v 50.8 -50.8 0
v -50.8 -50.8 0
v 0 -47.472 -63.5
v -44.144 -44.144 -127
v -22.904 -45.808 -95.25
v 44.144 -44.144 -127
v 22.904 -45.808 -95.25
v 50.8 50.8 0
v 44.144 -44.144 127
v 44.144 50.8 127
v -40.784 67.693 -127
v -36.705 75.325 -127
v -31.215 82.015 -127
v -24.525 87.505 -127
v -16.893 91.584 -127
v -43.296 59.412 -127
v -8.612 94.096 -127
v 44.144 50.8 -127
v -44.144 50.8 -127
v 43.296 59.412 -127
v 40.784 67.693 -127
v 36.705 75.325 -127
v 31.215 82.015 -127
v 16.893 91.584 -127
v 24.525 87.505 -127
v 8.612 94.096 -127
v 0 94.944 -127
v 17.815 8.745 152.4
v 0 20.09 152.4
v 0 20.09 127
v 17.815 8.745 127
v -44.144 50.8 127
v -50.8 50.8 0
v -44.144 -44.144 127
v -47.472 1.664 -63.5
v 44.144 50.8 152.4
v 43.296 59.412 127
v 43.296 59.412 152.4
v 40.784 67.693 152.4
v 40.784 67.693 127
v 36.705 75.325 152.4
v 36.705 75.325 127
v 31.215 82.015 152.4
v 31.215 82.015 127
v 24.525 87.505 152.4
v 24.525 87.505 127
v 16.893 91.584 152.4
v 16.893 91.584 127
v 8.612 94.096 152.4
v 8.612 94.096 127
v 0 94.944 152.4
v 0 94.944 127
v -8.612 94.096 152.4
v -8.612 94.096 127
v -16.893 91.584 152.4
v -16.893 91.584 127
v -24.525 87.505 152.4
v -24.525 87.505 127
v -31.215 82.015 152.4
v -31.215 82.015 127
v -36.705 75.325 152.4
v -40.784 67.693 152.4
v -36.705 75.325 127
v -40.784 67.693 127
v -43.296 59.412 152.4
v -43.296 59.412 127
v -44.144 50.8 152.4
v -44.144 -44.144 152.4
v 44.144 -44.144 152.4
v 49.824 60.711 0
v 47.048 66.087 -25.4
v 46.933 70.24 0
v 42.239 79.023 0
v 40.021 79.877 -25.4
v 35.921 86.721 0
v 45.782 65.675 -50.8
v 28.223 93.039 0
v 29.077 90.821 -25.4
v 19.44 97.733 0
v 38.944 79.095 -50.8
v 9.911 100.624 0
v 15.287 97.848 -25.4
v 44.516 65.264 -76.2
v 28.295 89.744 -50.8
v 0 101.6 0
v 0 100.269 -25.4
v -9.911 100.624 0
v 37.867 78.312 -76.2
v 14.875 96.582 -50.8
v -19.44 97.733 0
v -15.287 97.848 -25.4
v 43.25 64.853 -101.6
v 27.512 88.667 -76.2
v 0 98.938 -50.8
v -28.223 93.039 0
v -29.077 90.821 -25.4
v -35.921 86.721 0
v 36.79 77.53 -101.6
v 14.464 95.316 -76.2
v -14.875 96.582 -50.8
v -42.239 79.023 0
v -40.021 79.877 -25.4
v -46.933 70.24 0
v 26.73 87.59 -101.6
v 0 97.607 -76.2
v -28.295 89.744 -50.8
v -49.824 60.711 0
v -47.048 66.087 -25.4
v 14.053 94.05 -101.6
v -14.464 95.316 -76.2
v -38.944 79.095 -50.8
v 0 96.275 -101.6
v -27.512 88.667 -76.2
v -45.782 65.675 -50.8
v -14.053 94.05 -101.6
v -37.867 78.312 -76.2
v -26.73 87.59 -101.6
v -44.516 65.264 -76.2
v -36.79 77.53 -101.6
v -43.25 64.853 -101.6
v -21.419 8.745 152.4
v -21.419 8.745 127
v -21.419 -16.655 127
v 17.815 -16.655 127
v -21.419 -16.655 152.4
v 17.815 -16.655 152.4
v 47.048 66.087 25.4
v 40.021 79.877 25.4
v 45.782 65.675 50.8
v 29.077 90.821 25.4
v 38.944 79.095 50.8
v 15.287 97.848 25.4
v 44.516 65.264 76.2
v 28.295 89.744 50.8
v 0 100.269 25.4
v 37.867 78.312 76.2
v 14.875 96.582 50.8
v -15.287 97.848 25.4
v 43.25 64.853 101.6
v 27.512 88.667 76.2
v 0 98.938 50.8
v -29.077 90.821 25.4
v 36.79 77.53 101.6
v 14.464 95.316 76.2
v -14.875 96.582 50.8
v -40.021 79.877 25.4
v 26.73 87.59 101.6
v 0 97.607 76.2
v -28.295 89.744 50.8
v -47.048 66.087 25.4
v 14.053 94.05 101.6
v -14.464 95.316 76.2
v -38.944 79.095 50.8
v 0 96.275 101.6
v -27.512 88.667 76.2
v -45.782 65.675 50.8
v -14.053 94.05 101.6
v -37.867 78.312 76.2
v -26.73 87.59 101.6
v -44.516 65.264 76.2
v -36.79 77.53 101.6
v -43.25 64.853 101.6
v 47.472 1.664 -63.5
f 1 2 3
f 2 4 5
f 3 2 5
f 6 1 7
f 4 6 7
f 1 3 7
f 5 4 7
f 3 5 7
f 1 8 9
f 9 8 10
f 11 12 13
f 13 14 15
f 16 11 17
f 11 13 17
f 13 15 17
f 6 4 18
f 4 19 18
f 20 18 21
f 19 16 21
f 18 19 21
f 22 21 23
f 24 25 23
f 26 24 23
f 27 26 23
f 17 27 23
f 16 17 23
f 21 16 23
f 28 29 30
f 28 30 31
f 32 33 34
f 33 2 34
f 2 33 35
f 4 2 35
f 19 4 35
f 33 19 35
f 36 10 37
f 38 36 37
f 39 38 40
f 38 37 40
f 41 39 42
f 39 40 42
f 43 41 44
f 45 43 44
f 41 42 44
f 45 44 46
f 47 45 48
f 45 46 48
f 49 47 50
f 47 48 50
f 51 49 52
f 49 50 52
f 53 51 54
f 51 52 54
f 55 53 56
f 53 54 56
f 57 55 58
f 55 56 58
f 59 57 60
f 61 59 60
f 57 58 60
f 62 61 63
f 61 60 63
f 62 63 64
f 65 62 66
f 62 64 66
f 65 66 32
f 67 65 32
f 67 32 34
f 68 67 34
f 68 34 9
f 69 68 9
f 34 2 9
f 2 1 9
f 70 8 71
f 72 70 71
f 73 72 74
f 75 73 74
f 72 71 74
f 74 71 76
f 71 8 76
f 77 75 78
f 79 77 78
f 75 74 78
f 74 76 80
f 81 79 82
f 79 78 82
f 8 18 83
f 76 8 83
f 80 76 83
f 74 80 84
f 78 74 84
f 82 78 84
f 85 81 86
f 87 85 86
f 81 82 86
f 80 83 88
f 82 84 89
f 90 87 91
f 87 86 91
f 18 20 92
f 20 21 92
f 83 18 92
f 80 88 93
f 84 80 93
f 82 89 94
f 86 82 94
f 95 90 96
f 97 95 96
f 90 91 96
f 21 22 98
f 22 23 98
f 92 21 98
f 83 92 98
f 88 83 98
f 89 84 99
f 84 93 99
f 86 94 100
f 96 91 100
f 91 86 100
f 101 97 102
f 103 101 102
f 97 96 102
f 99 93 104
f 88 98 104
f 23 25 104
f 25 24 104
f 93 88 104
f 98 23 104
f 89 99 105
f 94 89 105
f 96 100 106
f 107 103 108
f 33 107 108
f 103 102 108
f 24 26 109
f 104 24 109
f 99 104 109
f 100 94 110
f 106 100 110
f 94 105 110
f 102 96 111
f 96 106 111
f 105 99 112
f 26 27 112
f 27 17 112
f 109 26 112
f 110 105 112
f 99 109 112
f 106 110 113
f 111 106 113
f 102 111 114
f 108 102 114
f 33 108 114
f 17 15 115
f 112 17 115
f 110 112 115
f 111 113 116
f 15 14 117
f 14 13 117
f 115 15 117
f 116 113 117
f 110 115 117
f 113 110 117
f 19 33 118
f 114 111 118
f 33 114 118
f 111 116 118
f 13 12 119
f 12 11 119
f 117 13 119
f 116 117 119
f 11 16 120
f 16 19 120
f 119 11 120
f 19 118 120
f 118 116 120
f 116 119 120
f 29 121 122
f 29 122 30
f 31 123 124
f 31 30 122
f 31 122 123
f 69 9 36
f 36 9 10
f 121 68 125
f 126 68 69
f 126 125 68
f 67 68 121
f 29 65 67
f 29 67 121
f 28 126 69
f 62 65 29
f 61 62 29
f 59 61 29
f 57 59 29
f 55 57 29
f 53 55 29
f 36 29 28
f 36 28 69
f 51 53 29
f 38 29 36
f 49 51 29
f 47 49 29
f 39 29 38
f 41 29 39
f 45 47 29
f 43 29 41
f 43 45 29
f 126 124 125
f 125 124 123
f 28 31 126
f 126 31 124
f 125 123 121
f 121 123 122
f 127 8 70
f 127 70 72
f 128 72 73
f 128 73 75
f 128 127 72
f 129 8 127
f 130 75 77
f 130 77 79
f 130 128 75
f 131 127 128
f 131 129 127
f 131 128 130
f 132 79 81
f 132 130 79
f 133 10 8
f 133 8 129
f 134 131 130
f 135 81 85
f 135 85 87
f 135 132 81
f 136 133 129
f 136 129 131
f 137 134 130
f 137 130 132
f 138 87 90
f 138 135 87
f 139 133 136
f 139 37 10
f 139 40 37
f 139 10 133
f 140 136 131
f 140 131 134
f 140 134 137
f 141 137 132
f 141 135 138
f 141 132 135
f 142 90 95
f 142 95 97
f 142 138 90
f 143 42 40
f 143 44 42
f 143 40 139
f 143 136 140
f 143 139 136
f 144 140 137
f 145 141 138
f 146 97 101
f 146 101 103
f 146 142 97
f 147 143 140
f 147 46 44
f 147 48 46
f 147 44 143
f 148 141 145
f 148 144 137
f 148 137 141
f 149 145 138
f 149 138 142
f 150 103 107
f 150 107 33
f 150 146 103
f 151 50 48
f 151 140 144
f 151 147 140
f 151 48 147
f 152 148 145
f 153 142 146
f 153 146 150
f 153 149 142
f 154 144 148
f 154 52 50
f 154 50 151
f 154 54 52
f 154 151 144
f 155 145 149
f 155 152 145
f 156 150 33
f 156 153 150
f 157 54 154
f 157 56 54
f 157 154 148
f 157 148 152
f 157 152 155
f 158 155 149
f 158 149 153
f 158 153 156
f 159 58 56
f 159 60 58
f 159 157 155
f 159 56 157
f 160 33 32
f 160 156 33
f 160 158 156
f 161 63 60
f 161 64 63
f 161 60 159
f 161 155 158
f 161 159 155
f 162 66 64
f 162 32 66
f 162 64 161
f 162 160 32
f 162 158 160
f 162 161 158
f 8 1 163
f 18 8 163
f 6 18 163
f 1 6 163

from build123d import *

# Parameters (mm, degrees)
F1_DEPTH = 127
F1_TAPER = 3
F3_DEPTH = 25.4


with BuildPart() as f1:
    # F0 (on Top) → F1 (new body, symmetric)
    with BuildSketch(Plane.XY):
        with BuildLine():
            Line((-50.8, -50.8), (50.8, -50.8))
            Line((50.8, -50.8), (50.8, 50.8))
            ThreePointArc((50.8, 50.8), (0, 101.6), (-50.8, 50.8))
            Line((-50.8, 50.8), (-50.8, -50.8))
        make_face()
    extrude(amount=F1_DEPTH, both=True, taper=F1_TAPER)

    # F2 (on face) → F3 (join)
    with BuildSketch(Plane.XY.offset(127)):
        with BuildLine():
            ThreePointArc((44.1442120311, 50.8), (0, 94.9442120311), (-44.1442120311, 50.8))
            Line((-44.1442120311, 50.8), (-44.1442120311, -44.1442120311))
            Line((-44.1442120311, -44.1442120311), (44.1442120311, -44.1442120311))
            Line((44.1442120311, -44.1442120311), (44.1442120311, 50.8))
        make_face()
        Polygon((-21.4192807622, -16.6554342237), (-21.4192807622, 8.7445657763), (0, 20.0903888761), (17.8153019142, 8.7445657763), (17.8153019142, -16.6554342237), align=None, mode=Mode.SUBTRACT)
    extrude(amount=F3_DEPTH)


solid = f1.part
